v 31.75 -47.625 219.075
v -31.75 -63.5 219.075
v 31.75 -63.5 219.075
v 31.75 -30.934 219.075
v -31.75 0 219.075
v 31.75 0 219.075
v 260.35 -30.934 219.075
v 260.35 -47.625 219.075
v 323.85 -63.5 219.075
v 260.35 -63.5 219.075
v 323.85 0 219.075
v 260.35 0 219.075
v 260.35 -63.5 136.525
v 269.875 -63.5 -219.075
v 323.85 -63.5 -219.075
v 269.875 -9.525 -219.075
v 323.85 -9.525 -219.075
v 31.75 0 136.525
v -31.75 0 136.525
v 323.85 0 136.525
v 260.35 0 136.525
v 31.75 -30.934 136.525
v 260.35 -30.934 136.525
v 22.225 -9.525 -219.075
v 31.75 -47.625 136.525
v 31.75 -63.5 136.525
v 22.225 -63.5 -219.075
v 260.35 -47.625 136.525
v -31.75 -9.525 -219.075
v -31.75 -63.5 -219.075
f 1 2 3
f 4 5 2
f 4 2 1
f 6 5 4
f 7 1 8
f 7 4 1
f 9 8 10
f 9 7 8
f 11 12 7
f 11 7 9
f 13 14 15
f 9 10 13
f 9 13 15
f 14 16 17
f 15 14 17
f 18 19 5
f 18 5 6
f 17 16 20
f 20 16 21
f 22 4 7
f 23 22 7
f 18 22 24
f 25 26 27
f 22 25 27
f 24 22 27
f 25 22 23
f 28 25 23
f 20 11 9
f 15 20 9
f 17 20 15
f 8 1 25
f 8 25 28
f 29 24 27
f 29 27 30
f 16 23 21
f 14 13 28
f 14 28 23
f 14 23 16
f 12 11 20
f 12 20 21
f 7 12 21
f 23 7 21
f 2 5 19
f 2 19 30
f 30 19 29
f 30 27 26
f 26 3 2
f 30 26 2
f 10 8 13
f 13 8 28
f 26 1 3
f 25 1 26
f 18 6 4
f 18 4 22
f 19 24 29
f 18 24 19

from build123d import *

# Parameters (mm, degrees)
F1_DEPTH  = 63.5
F3_DEPTH  = 63.5
F4_W      = 228.6
F4_H      = 16.6908878535
F6_DEPTH  = 82.55
F12_DEPTH = 63.5


with BuildPart() as f1:
    # F0 (on Front) → F1 (new body)
    with BuildSketch(Plane.XZ):
        Polygon((-31.75, -219.075), (22.225, -219.075), (31.75, 136.525), (31.75, 219.075), (-31.75, 219.075), align=None)
    extrude(amount=F1_DEPTH)

    # F2 (on face) → F3 (cut)
    with BuildSketch(Plane(origin=(-31.75, 0, 0), x_dir=(0, -1, 0), z_dir=(-1, 0, 0))):
        Polygon((9.525, -219.075), (0, 136.525), (0, -219.075), align=None)
    extrude(amount=-F3_DEPTH, mode=Mode.SUBTRACT)

    # F5: F1 across plane


with BuildPart() as f1_1:
    add(f1.part)
    add(f1.part.mirror(Plane.YZ))

    # F4 (on face) → F6 (join)
    with BuildSketch(Plane.XY.offset(219.075)):
        with Locations((146.05, -39.2795560732)):
            Rectangle(F4_W, F4_H)
    extrude(amount=-F6_DEPTH)

    # F11 (on face) → F12 (cut)
    with BuildSketch(Plane.XZ.offset(63.5)):
        Polygon((31.75, -219.075), (31.75, 136.525), (22.225, -219.075), align=None)
    extrude(amount=-F12_DEPTH, mode=Mode.SUBTRACT)

    # F13: F1 across plane


with BuildPart() as f1_2:
    add(f1_1.part)
    add(f1_1.part.mirror(Plane(origin=(146.05, -47.625, 219.075), x_dir=(0, 1, 0), z_dir=(1, 0, 0))))


solid = f1_2.part
